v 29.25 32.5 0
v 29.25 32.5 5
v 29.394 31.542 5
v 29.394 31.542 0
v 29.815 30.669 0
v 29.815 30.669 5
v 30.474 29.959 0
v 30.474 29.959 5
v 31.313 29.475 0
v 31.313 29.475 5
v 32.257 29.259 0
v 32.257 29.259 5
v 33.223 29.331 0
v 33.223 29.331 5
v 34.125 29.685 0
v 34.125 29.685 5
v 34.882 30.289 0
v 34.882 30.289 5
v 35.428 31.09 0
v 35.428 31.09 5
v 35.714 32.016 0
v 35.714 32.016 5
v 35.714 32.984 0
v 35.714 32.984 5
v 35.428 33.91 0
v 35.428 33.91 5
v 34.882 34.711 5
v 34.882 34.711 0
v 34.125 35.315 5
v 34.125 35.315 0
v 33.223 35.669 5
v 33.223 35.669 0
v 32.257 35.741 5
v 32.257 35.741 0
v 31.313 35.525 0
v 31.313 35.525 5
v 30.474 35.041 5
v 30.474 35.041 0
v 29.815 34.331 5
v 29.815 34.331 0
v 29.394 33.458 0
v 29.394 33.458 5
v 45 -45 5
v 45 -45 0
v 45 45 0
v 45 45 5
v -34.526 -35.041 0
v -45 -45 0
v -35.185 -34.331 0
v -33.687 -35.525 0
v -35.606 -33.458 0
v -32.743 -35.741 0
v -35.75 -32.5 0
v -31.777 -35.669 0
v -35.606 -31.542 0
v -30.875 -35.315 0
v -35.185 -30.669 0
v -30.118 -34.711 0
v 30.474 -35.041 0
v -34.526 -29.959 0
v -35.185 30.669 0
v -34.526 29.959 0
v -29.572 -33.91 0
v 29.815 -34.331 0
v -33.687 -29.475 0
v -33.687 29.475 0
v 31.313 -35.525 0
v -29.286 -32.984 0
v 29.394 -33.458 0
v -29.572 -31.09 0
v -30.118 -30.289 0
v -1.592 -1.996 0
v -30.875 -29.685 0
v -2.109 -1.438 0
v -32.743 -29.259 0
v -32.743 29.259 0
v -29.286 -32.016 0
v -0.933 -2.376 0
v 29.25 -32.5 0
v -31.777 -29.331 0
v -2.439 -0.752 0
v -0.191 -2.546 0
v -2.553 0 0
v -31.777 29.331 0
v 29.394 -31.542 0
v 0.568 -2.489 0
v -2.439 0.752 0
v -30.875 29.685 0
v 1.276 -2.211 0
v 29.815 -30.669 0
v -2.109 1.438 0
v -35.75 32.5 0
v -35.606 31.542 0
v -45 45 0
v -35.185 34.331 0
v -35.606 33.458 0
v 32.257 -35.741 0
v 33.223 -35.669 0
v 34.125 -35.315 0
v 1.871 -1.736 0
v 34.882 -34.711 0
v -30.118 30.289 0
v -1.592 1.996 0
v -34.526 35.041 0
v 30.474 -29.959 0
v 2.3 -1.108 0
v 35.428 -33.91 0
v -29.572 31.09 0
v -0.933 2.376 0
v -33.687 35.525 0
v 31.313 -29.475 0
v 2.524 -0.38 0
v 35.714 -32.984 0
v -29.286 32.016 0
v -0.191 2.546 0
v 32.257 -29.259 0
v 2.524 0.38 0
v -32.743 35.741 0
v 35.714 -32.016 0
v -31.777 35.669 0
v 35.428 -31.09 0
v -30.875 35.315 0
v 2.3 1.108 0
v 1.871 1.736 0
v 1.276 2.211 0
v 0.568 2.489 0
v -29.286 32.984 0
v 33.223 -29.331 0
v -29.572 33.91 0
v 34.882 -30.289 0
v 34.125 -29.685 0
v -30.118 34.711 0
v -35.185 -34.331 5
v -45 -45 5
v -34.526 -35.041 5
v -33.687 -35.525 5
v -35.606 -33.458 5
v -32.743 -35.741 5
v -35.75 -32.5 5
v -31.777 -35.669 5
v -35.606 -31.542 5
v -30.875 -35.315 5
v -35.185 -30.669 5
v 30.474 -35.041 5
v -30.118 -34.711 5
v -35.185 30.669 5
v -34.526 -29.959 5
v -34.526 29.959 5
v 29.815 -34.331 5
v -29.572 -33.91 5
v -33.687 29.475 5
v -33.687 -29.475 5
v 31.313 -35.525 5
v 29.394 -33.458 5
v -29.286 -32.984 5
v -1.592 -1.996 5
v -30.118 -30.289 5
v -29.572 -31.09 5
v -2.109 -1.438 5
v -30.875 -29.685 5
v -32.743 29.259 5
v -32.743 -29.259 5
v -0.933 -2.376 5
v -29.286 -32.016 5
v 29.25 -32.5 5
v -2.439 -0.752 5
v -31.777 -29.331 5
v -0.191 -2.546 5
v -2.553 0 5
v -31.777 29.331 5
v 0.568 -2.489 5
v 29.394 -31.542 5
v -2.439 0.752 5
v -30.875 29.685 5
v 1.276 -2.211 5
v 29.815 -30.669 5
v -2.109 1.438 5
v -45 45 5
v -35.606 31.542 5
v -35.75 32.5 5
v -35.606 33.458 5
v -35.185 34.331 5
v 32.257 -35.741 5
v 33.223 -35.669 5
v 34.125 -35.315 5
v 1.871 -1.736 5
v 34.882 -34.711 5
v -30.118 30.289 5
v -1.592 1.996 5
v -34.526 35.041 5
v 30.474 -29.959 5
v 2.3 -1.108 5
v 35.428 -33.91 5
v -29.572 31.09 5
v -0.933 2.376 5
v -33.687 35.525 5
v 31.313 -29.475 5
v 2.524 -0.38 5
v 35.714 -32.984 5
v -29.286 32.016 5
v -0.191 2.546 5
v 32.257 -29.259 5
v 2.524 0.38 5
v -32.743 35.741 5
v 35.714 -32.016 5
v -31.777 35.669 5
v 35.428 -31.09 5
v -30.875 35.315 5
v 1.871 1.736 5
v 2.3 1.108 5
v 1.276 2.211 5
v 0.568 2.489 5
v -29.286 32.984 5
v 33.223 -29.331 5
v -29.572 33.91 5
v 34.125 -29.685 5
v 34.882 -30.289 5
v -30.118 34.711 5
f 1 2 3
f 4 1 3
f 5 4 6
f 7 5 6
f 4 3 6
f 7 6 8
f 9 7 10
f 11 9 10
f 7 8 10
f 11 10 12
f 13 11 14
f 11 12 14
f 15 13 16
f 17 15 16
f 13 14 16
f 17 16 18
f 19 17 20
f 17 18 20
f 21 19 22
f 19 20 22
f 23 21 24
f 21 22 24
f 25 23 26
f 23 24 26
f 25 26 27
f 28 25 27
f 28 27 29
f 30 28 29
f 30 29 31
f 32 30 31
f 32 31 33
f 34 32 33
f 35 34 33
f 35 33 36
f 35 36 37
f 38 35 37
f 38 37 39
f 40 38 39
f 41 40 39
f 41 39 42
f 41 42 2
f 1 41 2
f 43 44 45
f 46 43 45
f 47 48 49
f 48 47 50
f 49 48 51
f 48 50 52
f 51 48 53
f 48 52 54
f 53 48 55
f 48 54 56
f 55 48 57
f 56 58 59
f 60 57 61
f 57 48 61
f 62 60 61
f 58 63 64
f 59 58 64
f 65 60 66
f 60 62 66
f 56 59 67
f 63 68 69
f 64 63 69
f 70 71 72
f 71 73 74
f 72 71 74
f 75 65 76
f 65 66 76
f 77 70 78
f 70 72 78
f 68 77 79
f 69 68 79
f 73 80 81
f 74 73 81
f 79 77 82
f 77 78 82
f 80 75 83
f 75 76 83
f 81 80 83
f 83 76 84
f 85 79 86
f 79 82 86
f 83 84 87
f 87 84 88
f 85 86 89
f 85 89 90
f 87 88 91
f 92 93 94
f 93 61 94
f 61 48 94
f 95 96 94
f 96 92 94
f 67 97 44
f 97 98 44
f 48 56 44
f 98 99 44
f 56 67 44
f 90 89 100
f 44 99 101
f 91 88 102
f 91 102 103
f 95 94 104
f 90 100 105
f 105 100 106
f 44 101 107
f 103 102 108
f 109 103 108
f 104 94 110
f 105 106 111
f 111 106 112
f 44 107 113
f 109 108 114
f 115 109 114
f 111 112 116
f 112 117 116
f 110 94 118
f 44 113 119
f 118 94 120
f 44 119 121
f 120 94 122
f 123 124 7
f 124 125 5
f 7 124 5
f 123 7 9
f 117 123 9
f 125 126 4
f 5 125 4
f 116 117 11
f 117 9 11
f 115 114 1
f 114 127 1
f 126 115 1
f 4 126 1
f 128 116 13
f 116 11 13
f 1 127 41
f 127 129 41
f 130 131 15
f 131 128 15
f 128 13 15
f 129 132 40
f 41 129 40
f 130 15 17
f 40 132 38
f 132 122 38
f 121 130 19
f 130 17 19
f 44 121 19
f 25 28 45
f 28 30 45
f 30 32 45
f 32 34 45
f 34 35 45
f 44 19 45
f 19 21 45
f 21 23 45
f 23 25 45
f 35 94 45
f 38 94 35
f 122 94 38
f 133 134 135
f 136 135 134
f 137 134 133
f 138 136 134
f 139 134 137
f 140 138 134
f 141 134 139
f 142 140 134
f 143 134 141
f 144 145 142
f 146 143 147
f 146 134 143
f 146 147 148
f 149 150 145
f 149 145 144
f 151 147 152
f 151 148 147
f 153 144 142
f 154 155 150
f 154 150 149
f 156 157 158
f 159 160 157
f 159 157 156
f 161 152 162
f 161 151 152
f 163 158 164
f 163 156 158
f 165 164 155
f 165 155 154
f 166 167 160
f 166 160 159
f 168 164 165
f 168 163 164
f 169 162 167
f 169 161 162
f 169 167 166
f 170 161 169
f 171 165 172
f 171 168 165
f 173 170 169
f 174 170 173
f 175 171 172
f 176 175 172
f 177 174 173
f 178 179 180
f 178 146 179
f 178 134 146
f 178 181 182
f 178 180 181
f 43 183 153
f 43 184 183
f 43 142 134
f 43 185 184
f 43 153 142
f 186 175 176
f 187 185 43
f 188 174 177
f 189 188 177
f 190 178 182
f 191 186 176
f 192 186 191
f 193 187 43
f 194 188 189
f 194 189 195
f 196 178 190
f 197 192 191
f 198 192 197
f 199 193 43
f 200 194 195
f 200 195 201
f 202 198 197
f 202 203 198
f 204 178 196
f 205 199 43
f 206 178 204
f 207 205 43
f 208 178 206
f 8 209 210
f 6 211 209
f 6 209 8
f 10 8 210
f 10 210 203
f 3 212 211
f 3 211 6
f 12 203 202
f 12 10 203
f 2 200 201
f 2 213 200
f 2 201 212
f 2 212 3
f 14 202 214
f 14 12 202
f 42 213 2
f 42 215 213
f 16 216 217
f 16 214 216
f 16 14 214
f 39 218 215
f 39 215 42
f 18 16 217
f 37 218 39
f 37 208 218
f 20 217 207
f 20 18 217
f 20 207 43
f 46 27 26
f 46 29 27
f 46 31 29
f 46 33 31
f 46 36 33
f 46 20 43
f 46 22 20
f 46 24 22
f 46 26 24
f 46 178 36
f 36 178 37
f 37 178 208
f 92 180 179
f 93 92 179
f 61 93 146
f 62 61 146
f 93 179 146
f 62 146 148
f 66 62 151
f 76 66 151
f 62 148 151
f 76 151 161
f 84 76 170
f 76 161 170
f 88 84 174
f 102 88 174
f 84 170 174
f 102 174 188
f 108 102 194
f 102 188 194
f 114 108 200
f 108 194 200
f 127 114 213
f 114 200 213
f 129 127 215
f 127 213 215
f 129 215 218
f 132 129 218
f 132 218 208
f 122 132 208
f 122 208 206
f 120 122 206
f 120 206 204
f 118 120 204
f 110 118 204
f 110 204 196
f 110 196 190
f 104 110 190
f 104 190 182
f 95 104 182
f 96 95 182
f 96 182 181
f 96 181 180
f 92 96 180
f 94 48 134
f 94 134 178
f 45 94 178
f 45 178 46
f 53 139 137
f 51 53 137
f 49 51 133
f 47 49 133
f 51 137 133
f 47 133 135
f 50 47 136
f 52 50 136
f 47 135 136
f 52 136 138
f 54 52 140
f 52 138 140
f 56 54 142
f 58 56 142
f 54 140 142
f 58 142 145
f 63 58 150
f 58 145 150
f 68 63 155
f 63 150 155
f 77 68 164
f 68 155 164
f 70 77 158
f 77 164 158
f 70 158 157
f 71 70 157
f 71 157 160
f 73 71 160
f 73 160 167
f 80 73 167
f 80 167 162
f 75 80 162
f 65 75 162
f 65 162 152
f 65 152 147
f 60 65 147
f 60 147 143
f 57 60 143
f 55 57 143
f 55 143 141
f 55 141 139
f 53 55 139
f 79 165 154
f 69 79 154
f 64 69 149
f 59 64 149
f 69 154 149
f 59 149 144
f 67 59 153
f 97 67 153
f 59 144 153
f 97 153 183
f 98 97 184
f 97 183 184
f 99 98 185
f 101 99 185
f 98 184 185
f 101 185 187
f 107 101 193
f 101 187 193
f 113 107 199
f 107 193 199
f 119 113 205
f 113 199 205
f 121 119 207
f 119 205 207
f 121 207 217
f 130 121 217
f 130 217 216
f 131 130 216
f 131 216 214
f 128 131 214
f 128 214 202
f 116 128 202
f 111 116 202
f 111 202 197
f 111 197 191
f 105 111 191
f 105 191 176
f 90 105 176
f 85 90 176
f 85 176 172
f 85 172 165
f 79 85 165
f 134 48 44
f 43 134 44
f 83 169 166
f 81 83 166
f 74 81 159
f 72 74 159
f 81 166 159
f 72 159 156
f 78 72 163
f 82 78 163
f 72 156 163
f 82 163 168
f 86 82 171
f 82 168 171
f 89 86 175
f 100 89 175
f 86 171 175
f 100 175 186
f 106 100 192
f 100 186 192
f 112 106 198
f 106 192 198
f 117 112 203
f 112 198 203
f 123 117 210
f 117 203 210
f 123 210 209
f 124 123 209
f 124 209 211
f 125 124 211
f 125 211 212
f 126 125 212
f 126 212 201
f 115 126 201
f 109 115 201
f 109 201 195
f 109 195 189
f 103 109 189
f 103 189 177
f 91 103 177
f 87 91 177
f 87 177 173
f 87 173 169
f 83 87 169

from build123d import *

# Parameters (mm, degrees)
F0_W     = 90
F0_H     = 90
F1_DEPTH = 5
F2_D     = 6.5
F3_D     = 5.1054


with BuildPart() as f1:
    # F0 (on Top) → F1 (new body)
    with BuildSketch(Plane.XY):
        Rectangle(F0_W, F0_H)
    extrude(amount=F1_DEPTH)

    # F2 (through all)
    with Locations(Plane(origin=(0, 0, 0), x_dir=(1, 0, 0), z_dir=(0, 0, -1))):
        with Locations((-32.5, -32.5), (32.5, -32.5), (32.5, 32.5), (-32.5, 32.5)):
            Hole(F2_D / 2)

    # F3 (through all)
    with Locations(Plane(origin=(0, 0, 0), x_dir=(1, 0, 0), z_dir=(0, 0, -1))):
        with Locations((0, 0)):
            Hole(F3_D / 2)


solid = f1.part
